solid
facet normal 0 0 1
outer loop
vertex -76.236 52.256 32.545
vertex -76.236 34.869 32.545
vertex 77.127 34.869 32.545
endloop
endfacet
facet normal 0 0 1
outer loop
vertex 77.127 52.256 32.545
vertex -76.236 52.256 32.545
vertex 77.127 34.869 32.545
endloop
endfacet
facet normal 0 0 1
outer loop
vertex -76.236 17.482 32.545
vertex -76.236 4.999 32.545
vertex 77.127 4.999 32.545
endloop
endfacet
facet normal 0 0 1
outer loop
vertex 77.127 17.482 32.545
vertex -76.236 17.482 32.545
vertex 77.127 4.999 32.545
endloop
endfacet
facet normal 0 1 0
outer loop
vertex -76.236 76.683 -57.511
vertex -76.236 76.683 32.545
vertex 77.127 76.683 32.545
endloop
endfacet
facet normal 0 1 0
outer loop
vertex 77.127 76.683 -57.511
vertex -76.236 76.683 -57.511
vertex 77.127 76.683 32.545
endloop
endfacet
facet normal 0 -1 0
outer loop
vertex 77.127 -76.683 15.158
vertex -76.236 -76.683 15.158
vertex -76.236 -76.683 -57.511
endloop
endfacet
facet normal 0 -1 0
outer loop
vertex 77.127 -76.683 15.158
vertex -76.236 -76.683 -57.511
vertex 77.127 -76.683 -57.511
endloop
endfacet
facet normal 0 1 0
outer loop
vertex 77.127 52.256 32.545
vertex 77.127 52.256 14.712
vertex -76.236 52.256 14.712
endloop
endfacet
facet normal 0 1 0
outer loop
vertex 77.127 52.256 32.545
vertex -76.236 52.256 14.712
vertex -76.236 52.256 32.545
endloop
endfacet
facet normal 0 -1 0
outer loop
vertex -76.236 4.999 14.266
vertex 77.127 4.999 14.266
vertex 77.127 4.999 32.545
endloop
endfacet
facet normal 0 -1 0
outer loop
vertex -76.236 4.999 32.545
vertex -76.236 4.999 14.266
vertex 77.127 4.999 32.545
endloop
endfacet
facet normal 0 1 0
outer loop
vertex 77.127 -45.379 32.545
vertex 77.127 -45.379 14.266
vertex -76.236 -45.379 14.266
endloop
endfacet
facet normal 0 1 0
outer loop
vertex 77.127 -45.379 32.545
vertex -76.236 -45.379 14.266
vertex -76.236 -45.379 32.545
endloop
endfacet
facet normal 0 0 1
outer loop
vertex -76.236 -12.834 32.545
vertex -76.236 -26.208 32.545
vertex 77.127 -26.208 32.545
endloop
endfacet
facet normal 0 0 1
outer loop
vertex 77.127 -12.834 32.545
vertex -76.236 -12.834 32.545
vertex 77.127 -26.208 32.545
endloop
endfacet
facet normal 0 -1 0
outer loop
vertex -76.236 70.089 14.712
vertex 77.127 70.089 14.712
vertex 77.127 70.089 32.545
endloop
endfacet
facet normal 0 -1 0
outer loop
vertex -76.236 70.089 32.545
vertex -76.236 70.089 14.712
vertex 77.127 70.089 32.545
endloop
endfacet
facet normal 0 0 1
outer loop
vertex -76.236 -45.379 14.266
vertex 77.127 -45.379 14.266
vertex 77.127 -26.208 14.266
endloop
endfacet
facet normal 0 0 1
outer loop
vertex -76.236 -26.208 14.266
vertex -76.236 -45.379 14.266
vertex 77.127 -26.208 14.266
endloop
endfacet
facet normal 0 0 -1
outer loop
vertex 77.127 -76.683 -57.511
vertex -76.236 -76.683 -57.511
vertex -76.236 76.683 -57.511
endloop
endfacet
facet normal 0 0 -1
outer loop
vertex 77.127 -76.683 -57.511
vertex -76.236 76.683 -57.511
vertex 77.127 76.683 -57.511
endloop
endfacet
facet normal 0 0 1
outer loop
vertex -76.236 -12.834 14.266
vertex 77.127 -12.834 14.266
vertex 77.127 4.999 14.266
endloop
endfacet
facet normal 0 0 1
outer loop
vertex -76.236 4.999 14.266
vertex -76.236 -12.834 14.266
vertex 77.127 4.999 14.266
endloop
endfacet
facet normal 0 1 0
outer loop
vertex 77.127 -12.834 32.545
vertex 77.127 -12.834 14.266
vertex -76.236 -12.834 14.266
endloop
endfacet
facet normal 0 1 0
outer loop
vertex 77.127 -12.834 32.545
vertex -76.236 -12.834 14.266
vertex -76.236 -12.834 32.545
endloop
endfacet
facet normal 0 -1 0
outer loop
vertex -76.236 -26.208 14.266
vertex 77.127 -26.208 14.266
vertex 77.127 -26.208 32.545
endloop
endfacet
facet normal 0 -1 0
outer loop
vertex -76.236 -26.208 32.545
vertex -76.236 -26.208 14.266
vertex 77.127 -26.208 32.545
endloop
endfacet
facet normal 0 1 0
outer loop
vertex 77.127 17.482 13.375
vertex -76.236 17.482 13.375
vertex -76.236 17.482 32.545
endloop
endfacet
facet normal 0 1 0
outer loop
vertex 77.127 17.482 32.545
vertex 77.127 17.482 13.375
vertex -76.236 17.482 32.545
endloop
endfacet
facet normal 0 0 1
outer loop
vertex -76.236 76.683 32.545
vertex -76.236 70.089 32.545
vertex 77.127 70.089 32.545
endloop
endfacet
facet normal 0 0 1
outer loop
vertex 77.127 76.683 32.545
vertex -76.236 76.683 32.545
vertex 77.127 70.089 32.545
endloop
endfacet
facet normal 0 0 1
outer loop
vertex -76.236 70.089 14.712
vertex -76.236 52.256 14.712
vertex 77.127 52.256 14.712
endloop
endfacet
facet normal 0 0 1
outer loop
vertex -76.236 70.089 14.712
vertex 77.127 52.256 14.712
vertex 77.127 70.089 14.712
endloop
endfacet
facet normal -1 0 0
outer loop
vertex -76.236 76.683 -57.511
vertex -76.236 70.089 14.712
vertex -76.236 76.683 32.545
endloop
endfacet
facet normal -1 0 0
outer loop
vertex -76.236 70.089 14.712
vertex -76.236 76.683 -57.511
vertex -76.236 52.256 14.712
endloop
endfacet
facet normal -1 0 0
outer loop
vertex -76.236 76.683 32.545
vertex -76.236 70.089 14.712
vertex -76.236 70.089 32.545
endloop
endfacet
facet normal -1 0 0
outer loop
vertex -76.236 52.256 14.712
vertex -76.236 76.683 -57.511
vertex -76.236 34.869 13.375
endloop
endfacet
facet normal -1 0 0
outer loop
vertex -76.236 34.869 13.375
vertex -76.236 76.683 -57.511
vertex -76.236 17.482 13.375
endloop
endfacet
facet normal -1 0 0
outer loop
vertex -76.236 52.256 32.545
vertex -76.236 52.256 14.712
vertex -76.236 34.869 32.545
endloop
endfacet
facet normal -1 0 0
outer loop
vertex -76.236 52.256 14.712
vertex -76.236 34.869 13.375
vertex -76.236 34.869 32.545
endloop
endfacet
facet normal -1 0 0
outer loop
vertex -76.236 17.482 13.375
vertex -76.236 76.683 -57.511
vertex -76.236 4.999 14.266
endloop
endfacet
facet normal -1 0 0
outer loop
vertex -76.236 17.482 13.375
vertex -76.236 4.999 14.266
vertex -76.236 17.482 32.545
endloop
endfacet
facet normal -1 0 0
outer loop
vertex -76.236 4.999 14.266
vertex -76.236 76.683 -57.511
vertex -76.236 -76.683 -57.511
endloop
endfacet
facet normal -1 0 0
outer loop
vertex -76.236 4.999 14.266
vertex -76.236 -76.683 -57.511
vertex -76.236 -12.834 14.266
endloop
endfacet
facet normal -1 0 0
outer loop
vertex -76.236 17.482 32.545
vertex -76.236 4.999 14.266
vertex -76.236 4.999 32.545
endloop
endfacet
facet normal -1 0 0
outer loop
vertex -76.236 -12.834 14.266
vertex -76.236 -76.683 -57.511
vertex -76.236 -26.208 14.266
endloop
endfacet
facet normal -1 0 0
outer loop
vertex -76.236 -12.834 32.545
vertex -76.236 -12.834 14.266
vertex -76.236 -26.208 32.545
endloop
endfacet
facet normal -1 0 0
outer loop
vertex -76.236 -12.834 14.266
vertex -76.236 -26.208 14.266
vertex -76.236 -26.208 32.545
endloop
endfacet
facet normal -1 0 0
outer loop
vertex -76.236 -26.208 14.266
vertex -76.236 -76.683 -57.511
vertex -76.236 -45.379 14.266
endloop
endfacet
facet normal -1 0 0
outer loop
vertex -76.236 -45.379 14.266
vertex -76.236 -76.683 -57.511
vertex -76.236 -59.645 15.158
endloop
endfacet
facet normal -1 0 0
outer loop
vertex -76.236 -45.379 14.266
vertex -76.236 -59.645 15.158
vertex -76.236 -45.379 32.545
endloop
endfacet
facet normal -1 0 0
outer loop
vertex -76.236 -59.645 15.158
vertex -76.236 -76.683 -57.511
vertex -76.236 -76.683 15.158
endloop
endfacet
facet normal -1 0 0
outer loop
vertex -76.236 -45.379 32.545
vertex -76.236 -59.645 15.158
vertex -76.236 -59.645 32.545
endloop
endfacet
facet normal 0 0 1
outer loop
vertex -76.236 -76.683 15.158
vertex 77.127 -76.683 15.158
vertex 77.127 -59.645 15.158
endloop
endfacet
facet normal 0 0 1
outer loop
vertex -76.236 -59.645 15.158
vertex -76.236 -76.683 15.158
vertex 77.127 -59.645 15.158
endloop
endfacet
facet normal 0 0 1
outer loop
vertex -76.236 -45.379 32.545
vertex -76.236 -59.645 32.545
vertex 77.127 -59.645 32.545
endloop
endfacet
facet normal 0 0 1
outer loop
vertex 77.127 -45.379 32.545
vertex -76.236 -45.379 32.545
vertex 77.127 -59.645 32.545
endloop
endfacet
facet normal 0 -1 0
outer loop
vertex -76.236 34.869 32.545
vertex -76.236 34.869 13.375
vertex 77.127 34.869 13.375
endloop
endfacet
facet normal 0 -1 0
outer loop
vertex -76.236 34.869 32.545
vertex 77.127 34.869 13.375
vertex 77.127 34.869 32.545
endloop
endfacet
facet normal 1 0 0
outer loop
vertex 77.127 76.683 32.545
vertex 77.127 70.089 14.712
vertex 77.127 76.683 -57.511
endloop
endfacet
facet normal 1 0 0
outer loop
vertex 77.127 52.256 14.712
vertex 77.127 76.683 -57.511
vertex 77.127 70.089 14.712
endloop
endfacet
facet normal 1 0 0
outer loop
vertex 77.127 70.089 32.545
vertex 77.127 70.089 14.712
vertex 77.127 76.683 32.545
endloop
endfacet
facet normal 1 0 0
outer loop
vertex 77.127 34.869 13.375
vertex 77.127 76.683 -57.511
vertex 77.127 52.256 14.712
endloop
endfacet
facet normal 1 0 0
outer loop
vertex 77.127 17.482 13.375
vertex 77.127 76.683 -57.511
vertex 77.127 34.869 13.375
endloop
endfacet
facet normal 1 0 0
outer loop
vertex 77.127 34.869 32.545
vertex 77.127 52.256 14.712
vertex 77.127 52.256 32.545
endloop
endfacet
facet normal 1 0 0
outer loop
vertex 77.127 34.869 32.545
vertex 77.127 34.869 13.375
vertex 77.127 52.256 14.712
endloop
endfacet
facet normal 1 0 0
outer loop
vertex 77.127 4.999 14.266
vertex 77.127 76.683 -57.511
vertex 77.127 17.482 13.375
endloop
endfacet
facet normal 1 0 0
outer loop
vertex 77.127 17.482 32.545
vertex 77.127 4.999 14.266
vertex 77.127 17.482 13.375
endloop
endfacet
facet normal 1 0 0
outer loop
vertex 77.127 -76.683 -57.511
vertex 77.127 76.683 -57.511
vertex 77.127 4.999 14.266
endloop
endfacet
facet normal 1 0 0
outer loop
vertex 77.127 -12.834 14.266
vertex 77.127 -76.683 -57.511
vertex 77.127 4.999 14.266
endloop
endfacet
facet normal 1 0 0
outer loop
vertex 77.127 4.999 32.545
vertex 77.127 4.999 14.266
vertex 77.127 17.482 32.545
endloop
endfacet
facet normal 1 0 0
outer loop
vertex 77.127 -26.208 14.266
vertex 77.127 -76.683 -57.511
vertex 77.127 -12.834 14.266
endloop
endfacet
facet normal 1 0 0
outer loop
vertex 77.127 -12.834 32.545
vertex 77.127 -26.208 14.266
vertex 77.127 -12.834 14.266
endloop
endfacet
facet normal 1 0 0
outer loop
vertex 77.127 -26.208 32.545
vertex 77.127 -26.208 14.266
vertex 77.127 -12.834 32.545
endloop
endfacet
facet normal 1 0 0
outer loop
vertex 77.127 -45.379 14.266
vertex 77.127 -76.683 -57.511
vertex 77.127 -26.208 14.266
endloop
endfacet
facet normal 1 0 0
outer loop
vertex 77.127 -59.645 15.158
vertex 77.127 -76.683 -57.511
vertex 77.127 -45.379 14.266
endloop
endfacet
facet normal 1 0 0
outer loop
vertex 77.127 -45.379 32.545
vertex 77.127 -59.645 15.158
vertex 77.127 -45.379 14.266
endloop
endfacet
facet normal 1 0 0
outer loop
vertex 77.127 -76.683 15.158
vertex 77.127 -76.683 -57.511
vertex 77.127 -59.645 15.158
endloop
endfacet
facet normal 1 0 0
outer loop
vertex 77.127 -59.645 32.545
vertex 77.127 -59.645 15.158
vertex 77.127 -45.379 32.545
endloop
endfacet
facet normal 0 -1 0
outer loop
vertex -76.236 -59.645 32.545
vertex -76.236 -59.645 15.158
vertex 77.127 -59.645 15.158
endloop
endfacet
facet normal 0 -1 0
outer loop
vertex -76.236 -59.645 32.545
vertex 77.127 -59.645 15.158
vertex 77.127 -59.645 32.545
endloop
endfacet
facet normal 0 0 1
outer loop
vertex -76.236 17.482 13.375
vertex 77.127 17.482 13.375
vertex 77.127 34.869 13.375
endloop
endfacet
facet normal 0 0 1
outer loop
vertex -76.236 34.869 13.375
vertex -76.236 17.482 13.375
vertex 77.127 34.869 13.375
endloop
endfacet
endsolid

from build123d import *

# Parameters (mm, degrees)
F0_W     = 153.3627957106
F0_H     = 90.0560617447
F1_DEPTH = 76.6826
F2_W     = 17.0374948467
F2_H     = 17.3870613798
F2_W_2   = 19.1703476012
F2_H_2   = 18.2787058875
F2_W_3   = 17.8328882903
F2_W_4   = 17.3870567232
F2_H_3   = 19.1703503951
F2_W_5   = 17.8328789771
F2_H_4   = 17.832884565
F3_DEPTH = 228.6


with BuildPart() as f1:
    # F0 (on Front) → F1 (new body, symmetric)
    with BuildSketch(Plane.XZ):
        with Locations((0.4458203912, -12.4830156565)):
            Rectangle(F0_W, F0_H)
    extrude(amount=F1_DEPTH, both=True)

    # F2 (on face) → F3 (cut)
    with BuildSketch(Plane.YZ.offset(77.1272182465)):
        with Locations((-68.1638525767, 23.8514845259)):
            Rectangle(F2_W, F2_H)
        with Locations((-35.7936229557, 23.4056622721)):
            Rectangle(F2_W_2, F2_H_2)
        with Locations((-3.9173448458, 23.4056622721)):
            Rectangle(F2_W_3, F2_H_2)
        with Locations((26.1756433174, 22.9598400183)):
            Rectangle(F2_W_4, F2_H_3)
        with Locations((61.172677204, 23.6285729334)):
            Rectangle(F2_W_5, F2_H_4)
    extrude(amount=-F3_DEPTH, mode=Mode.SUBTRACT)


solid = f1.part
